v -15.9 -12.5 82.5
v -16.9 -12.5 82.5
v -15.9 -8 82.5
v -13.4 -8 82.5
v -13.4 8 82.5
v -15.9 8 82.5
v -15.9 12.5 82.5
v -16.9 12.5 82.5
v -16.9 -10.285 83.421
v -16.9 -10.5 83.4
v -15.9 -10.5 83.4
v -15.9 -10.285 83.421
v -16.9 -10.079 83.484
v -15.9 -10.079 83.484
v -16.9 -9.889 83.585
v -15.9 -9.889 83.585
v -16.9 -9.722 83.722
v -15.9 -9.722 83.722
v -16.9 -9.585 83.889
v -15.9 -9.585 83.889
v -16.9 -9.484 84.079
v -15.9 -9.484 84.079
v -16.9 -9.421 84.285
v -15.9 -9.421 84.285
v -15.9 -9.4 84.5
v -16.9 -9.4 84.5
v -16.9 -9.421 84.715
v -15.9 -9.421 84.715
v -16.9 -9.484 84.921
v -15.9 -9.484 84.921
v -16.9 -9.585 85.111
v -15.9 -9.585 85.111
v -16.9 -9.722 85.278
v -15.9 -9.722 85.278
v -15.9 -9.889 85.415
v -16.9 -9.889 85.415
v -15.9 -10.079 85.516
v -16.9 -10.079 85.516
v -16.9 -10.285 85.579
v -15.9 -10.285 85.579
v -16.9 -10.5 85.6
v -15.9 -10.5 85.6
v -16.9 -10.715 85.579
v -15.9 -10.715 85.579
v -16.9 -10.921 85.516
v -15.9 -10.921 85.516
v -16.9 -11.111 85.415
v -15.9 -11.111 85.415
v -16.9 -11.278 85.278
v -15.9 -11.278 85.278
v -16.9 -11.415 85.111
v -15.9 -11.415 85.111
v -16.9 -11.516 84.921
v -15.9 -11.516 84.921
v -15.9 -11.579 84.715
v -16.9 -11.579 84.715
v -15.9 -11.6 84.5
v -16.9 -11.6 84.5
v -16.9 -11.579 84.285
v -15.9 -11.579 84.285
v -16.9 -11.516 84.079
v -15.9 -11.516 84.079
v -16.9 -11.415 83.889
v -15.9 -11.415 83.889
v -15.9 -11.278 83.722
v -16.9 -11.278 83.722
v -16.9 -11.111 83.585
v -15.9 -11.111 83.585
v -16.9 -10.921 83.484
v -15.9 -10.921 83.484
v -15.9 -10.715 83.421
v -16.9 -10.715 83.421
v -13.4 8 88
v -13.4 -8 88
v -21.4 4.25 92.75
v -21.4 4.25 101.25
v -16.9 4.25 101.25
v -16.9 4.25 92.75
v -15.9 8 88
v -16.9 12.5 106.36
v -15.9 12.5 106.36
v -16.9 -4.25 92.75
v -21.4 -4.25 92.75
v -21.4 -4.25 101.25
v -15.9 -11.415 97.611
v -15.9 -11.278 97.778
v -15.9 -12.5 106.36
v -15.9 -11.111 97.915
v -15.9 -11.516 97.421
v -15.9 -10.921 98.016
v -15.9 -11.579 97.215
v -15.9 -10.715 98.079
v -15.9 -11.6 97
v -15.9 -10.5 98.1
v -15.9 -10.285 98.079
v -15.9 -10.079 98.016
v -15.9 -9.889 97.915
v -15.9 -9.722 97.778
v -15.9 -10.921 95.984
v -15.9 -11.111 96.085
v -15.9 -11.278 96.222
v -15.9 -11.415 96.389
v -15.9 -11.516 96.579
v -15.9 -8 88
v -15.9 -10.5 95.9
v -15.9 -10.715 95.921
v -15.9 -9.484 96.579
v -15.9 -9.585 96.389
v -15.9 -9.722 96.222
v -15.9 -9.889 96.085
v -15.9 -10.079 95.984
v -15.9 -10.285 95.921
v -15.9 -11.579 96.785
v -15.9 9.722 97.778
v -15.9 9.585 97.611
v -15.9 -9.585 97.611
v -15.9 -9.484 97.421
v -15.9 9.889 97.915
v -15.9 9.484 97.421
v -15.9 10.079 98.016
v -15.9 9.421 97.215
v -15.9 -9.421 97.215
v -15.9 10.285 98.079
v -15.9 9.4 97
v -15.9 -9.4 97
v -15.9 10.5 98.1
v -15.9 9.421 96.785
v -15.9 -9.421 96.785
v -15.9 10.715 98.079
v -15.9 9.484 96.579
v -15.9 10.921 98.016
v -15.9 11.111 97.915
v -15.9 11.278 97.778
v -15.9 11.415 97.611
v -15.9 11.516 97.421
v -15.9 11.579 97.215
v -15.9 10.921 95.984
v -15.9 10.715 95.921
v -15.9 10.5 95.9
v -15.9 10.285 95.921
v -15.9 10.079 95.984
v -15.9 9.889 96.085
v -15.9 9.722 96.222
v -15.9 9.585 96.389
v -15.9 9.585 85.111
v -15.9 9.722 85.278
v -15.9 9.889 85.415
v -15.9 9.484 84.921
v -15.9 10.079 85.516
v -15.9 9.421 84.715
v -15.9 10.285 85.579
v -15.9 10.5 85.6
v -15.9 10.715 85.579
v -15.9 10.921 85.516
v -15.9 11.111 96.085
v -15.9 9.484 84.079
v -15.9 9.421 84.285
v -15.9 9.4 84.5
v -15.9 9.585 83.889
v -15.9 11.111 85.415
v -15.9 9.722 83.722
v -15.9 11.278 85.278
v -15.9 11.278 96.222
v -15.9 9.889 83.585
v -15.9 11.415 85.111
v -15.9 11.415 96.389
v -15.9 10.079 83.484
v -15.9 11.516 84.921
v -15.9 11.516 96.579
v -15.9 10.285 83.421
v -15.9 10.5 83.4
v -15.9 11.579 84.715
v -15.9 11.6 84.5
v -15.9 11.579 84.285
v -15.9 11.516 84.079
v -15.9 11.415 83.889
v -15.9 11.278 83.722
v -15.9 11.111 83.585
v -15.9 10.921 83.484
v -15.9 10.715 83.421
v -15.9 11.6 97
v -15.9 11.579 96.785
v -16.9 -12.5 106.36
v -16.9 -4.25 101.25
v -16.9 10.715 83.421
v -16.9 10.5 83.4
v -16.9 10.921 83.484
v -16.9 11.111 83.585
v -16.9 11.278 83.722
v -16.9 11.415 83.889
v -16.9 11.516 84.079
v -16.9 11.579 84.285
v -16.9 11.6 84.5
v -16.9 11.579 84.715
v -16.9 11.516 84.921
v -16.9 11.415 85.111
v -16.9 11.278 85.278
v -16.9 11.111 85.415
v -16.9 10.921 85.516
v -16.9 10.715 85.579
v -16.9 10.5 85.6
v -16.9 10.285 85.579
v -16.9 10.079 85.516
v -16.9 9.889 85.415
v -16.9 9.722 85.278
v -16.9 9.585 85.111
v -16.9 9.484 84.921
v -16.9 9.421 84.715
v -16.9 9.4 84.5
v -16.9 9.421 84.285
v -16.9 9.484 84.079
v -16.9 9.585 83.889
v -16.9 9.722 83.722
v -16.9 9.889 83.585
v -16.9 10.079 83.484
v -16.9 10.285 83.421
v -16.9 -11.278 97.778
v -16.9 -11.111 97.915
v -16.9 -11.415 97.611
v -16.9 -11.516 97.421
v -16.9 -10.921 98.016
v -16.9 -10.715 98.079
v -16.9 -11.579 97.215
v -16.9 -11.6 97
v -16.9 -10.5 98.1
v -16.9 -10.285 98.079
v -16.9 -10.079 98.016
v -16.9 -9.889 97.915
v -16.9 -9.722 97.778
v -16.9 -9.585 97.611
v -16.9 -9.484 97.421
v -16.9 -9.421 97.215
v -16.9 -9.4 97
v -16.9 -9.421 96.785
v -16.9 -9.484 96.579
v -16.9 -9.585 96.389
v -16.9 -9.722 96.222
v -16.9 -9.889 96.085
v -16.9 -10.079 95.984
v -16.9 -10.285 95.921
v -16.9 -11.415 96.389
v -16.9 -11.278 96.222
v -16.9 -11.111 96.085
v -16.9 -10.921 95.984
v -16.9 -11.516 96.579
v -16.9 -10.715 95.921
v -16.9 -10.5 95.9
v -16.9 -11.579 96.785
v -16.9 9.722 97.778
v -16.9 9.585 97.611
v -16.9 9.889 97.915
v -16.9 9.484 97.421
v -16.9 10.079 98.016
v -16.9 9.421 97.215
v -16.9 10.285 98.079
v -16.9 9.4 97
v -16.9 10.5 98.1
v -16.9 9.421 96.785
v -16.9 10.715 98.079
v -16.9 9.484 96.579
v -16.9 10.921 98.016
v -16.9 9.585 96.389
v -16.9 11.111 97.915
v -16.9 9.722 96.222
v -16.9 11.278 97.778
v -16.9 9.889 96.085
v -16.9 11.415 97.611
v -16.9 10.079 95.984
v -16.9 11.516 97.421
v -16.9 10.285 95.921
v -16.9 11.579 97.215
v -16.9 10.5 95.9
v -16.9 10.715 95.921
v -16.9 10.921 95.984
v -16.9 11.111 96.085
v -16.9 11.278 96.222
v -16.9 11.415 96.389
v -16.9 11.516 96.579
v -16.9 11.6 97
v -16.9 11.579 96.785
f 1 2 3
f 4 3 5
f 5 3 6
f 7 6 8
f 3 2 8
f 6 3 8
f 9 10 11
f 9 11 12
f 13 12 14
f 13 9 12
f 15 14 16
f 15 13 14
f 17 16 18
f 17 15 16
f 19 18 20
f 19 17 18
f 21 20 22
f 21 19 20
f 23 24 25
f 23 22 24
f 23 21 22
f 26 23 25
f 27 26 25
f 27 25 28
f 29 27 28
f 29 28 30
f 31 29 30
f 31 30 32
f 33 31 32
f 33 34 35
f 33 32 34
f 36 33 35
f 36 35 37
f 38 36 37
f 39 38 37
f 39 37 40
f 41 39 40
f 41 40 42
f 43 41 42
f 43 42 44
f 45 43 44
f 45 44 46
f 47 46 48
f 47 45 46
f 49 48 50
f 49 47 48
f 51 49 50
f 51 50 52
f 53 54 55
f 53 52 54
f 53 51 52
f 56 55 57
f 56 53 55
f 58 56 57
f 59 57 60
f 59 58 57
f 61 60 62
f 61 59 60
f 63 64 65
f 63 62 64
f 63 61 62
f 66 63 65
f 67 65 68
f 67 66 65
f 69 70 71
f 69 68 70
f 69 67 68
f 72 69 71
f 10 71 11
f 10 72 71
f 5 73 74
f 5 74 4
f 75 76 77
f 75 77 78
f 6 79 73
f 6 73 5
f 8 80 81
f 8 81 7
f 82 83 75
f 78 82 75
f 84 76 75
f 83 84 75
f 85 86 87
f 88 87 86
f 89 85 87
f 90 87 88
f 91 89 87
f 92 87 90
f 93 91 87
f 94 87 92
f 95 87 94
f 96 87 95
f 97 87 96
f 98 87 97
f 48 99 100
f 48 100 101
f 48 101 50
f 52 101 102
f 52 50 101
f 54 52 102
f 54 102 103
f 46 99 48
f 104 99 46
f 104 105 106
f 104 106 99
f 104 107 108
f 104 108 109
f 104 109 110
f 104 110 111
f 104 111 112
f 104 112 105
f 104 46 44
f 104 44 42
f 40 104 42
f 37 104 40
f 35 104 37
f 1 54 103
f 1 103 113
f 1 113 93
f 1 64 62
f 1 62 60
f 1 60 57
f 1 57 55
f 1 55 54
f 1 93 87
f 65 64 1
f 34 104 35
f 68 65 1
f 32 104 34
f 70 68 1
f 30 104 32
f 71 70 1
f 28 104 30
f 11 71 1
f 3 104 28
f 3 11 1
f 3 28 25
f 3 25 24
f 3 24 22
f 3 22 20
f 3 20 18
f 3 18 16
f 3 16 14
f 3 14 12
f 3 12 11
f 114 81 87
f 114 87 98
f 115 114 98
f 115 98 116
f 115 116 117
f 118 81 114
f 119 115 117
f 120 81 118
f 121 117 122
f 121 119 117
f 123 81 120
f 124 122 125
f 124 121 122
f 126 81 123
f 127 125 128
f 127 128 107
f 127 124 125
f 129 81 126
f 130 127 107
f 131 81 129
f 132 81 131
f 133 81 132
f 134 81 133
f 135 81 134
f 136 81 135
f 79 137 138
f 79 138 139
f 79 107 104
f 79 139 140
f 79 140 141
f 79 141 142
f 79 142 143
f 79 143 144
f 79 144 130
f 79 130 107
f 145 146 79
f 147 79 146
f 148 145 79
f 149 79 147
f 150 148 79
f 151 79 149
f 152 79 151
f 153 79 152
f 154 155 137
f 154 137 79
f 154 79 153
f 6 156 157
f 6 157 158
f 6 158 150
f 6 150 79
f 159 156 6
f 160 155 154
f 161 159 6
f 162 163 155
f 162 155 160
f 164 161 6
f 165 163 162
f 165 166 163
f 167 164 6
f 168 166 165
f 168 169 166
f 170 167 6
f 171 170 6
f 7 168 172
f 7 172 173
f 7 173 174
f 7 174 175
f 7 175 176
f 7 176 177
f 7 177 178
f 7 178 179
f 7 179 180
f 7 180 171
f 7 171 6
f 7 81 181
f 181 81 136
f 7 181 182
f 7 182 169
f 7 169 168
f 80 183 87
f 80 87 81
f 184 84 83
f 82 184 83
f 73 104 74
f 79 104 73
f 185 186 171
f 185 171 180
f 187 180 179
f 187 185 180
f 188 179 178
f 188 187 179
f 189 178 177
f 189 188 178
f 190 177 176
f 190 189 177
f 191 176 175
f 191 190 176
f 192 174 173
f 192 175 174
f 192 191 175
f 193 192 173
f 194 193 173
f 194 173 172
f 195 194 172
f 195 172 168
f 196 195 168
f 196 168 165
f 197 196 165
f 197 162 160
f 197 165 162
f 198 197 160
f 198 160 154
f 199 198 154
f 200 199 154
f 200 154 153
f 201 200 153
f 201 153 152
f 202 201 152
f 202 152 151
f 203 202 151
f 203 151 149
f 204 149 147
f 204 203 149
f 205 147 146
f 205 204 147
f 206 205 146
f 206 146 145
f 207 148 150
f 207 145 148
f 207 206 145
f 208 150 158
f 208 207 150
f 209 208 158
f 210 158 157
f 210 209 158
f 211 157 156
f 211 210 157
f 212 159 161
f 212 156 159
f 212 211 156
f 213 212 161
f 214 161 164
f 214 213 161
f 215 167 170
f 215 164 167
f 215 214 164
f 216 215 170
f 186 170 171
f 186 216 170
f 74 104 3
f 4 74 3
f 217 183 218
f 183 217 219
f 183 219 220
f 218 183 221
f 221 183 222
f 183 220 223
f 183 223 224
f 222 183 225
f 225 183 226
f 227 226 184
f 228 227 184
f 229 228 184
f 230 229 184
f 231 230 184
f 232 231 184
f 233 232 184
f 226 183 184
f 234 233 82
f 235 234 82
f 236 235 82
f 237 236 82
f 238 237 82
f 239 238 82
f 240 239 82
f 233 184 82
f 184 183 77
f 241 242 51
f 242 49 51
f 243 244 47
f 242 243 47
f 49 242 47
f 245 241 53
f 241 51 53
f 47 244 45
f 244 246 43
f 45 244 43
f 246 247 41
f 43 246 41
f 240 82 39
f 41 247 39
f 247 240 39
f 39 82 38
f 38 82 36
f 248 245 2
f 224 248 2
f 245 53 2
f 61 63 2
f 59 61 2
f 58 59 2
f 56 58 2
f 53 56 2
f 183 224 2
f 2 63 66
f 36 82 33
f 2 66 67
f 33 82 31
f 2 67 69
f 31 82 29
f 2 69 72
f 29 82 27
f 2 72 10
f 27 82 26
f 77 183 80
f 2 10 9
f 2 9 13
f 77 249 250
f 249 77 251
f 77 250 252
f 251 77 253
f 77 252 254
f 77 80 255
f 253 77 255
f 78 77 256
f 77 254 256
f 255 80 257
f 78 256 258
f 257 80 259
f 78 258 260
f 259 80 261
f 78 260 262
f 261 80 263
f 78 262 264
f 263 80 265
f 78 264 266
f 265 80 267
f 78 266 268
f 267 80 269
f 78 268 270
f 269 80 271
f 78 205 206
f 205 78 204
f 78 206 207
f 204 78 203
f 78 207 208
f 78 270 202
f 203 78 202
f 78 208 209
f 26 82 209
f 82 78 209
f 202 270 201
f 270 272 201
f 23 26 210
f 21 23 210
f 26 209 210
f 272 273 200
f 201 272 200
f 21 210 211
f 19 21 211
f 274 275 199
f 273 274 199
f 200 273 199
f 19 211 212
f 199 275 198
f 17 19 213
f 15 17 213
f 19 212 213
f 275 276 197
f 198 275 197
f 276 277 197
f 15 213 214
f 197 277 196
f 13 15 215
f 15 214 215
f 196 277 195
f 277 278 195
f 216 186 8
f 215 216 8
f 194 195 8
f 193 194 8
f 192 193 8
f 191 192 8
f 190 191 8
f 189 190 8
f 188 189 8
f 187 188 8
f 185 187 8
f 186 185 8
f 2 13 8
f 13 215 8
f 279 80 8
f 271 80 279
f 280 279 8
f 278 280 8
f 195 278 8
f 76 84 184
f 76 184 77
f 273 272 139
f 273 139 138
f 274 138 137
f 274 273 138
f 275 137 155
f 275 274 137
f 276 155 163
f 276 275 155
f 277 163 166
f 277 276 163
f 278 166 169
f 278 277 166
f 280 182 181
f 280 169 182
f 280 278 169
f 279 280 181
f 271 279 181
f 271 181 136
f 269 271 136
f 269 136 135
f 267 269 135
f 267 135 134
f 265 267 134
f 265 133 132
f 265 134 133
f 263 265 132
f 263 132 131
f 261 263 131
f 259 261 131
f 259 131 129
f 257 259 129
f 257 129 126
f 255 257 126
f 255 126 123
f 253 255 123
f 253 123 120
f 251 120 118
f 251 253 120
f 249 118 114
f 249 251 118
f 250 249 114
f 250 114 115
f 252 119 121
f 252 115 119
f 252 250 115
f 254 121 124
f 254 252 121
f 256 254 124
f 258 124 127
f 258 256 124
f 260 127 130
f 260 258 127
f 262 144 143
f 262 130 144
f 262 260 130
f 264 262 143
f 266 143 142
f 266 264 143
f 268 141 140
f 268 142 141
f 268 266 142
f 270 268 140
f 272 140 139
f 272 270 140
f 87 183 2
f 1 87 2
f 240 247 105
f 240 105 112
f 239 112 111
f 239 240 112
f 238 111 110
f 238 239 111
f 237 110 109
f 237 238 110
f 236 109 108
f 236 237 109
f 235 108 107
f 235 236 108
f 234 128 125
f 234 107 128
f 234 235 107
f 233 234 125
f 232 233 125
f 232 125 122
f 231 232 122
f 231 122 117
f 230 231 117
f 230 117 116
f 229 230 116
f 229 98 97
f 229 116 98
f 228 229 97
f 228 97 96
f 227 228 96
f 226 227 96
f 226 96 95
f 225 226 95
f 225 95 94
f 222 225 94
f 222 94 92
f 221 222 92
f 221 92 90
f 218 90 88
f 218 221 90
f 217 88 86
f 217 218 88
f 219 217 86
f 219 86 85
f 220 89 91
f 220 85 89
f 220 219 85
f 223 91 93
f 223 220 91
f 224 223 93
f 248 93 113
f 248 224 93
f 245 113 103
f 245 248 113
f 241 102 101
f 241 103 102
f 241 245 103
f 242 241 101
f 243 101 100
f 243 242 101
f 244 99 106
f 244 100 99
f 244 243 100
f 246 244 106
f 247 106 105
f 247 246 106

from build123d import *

# Parameters (mm, degrees)
CROQUIS1_W              = 23.86
CROQUIS1_H              = 25
SALIENTE_EXTRUIR1_DEPTH = 1
CROQUIS2_R              = 1.1
CORTAR_EXTRUIR1_DEPTH   = 3
CROQUIS3_W              = 8.5
CROQUIS3_H              = 8.5
SALIENTE_EXTRUIR2_DEPTH = 4.5
CROQUIS4_W              = 5.5
CROQUIS4_H              = 16
SALIENTE_EXTRUIR3_DEPTH = 2.5


with BuildPart() as part:
    # Croquis1 → Saliente-Extruir1 (new body)
    with BuildSketch(Plane(origin=(-16.9, 0, 0), x_dir=(0, 0, -1), z_dir=(1, 0, 0))):
        with Locations((-94.43, 0)):
            Rectangle(CROQUIS1_W, CROQUIS1_H)
    extrude(amount=SALIENTE_EXTRUIR1_DEPTH)

    # Croquis2 → Cortar-Extruir1 (cut)
    with BuildSketch(Plane(origin=(-17.9, 0, 0), x_dir=(0, 0, -1), z_dir=(1, 0, 0))):
        with Locations((-97, -10.5)):
            Circle(CROQUIS2_R)
        with Locations((-84.5, -10.5)):
            Circle(CROQUIS2_R)
        with Locations((-97, 10.5)):
            Circle(CROQUIS2_R)
        with Locations((-84.5, 10.5)):
            Circle(CROQUIS2_R)
    extrude(amount=CORTAR_EXTRUIR1_DEPTH, mode=Mode.SUBTRACT)

    # Croquis3 → Saliente-Extruir2 (add)
    with BuildSketch(Plane(origin=(-21.4, 0, 0), x_dir=(0, 0, -1), z_dir=(1, 0, 0))):
        with Locations((-97, 0)):
            Rectangle(CROQUIS3_W, CROQUIS3_H)
    extrude(amount=SALIENTE_EXTRUIR2_DEPTH)

    # Croquis4 → Saliente-Extruir3 (add)
    with BuildSketch(Plane(origin=(-15.9, 0, 0), x_dir=(0, 0, -1), z_dir=(1, 0, 0))):
        with Locations((-85.25, 0)):
            Rectangle(CROQUIS4_W, CROQUIS4_H)
    extrude(amount=SALIENTE_EXTRUIR3_DEPTH)


solid = part.part
